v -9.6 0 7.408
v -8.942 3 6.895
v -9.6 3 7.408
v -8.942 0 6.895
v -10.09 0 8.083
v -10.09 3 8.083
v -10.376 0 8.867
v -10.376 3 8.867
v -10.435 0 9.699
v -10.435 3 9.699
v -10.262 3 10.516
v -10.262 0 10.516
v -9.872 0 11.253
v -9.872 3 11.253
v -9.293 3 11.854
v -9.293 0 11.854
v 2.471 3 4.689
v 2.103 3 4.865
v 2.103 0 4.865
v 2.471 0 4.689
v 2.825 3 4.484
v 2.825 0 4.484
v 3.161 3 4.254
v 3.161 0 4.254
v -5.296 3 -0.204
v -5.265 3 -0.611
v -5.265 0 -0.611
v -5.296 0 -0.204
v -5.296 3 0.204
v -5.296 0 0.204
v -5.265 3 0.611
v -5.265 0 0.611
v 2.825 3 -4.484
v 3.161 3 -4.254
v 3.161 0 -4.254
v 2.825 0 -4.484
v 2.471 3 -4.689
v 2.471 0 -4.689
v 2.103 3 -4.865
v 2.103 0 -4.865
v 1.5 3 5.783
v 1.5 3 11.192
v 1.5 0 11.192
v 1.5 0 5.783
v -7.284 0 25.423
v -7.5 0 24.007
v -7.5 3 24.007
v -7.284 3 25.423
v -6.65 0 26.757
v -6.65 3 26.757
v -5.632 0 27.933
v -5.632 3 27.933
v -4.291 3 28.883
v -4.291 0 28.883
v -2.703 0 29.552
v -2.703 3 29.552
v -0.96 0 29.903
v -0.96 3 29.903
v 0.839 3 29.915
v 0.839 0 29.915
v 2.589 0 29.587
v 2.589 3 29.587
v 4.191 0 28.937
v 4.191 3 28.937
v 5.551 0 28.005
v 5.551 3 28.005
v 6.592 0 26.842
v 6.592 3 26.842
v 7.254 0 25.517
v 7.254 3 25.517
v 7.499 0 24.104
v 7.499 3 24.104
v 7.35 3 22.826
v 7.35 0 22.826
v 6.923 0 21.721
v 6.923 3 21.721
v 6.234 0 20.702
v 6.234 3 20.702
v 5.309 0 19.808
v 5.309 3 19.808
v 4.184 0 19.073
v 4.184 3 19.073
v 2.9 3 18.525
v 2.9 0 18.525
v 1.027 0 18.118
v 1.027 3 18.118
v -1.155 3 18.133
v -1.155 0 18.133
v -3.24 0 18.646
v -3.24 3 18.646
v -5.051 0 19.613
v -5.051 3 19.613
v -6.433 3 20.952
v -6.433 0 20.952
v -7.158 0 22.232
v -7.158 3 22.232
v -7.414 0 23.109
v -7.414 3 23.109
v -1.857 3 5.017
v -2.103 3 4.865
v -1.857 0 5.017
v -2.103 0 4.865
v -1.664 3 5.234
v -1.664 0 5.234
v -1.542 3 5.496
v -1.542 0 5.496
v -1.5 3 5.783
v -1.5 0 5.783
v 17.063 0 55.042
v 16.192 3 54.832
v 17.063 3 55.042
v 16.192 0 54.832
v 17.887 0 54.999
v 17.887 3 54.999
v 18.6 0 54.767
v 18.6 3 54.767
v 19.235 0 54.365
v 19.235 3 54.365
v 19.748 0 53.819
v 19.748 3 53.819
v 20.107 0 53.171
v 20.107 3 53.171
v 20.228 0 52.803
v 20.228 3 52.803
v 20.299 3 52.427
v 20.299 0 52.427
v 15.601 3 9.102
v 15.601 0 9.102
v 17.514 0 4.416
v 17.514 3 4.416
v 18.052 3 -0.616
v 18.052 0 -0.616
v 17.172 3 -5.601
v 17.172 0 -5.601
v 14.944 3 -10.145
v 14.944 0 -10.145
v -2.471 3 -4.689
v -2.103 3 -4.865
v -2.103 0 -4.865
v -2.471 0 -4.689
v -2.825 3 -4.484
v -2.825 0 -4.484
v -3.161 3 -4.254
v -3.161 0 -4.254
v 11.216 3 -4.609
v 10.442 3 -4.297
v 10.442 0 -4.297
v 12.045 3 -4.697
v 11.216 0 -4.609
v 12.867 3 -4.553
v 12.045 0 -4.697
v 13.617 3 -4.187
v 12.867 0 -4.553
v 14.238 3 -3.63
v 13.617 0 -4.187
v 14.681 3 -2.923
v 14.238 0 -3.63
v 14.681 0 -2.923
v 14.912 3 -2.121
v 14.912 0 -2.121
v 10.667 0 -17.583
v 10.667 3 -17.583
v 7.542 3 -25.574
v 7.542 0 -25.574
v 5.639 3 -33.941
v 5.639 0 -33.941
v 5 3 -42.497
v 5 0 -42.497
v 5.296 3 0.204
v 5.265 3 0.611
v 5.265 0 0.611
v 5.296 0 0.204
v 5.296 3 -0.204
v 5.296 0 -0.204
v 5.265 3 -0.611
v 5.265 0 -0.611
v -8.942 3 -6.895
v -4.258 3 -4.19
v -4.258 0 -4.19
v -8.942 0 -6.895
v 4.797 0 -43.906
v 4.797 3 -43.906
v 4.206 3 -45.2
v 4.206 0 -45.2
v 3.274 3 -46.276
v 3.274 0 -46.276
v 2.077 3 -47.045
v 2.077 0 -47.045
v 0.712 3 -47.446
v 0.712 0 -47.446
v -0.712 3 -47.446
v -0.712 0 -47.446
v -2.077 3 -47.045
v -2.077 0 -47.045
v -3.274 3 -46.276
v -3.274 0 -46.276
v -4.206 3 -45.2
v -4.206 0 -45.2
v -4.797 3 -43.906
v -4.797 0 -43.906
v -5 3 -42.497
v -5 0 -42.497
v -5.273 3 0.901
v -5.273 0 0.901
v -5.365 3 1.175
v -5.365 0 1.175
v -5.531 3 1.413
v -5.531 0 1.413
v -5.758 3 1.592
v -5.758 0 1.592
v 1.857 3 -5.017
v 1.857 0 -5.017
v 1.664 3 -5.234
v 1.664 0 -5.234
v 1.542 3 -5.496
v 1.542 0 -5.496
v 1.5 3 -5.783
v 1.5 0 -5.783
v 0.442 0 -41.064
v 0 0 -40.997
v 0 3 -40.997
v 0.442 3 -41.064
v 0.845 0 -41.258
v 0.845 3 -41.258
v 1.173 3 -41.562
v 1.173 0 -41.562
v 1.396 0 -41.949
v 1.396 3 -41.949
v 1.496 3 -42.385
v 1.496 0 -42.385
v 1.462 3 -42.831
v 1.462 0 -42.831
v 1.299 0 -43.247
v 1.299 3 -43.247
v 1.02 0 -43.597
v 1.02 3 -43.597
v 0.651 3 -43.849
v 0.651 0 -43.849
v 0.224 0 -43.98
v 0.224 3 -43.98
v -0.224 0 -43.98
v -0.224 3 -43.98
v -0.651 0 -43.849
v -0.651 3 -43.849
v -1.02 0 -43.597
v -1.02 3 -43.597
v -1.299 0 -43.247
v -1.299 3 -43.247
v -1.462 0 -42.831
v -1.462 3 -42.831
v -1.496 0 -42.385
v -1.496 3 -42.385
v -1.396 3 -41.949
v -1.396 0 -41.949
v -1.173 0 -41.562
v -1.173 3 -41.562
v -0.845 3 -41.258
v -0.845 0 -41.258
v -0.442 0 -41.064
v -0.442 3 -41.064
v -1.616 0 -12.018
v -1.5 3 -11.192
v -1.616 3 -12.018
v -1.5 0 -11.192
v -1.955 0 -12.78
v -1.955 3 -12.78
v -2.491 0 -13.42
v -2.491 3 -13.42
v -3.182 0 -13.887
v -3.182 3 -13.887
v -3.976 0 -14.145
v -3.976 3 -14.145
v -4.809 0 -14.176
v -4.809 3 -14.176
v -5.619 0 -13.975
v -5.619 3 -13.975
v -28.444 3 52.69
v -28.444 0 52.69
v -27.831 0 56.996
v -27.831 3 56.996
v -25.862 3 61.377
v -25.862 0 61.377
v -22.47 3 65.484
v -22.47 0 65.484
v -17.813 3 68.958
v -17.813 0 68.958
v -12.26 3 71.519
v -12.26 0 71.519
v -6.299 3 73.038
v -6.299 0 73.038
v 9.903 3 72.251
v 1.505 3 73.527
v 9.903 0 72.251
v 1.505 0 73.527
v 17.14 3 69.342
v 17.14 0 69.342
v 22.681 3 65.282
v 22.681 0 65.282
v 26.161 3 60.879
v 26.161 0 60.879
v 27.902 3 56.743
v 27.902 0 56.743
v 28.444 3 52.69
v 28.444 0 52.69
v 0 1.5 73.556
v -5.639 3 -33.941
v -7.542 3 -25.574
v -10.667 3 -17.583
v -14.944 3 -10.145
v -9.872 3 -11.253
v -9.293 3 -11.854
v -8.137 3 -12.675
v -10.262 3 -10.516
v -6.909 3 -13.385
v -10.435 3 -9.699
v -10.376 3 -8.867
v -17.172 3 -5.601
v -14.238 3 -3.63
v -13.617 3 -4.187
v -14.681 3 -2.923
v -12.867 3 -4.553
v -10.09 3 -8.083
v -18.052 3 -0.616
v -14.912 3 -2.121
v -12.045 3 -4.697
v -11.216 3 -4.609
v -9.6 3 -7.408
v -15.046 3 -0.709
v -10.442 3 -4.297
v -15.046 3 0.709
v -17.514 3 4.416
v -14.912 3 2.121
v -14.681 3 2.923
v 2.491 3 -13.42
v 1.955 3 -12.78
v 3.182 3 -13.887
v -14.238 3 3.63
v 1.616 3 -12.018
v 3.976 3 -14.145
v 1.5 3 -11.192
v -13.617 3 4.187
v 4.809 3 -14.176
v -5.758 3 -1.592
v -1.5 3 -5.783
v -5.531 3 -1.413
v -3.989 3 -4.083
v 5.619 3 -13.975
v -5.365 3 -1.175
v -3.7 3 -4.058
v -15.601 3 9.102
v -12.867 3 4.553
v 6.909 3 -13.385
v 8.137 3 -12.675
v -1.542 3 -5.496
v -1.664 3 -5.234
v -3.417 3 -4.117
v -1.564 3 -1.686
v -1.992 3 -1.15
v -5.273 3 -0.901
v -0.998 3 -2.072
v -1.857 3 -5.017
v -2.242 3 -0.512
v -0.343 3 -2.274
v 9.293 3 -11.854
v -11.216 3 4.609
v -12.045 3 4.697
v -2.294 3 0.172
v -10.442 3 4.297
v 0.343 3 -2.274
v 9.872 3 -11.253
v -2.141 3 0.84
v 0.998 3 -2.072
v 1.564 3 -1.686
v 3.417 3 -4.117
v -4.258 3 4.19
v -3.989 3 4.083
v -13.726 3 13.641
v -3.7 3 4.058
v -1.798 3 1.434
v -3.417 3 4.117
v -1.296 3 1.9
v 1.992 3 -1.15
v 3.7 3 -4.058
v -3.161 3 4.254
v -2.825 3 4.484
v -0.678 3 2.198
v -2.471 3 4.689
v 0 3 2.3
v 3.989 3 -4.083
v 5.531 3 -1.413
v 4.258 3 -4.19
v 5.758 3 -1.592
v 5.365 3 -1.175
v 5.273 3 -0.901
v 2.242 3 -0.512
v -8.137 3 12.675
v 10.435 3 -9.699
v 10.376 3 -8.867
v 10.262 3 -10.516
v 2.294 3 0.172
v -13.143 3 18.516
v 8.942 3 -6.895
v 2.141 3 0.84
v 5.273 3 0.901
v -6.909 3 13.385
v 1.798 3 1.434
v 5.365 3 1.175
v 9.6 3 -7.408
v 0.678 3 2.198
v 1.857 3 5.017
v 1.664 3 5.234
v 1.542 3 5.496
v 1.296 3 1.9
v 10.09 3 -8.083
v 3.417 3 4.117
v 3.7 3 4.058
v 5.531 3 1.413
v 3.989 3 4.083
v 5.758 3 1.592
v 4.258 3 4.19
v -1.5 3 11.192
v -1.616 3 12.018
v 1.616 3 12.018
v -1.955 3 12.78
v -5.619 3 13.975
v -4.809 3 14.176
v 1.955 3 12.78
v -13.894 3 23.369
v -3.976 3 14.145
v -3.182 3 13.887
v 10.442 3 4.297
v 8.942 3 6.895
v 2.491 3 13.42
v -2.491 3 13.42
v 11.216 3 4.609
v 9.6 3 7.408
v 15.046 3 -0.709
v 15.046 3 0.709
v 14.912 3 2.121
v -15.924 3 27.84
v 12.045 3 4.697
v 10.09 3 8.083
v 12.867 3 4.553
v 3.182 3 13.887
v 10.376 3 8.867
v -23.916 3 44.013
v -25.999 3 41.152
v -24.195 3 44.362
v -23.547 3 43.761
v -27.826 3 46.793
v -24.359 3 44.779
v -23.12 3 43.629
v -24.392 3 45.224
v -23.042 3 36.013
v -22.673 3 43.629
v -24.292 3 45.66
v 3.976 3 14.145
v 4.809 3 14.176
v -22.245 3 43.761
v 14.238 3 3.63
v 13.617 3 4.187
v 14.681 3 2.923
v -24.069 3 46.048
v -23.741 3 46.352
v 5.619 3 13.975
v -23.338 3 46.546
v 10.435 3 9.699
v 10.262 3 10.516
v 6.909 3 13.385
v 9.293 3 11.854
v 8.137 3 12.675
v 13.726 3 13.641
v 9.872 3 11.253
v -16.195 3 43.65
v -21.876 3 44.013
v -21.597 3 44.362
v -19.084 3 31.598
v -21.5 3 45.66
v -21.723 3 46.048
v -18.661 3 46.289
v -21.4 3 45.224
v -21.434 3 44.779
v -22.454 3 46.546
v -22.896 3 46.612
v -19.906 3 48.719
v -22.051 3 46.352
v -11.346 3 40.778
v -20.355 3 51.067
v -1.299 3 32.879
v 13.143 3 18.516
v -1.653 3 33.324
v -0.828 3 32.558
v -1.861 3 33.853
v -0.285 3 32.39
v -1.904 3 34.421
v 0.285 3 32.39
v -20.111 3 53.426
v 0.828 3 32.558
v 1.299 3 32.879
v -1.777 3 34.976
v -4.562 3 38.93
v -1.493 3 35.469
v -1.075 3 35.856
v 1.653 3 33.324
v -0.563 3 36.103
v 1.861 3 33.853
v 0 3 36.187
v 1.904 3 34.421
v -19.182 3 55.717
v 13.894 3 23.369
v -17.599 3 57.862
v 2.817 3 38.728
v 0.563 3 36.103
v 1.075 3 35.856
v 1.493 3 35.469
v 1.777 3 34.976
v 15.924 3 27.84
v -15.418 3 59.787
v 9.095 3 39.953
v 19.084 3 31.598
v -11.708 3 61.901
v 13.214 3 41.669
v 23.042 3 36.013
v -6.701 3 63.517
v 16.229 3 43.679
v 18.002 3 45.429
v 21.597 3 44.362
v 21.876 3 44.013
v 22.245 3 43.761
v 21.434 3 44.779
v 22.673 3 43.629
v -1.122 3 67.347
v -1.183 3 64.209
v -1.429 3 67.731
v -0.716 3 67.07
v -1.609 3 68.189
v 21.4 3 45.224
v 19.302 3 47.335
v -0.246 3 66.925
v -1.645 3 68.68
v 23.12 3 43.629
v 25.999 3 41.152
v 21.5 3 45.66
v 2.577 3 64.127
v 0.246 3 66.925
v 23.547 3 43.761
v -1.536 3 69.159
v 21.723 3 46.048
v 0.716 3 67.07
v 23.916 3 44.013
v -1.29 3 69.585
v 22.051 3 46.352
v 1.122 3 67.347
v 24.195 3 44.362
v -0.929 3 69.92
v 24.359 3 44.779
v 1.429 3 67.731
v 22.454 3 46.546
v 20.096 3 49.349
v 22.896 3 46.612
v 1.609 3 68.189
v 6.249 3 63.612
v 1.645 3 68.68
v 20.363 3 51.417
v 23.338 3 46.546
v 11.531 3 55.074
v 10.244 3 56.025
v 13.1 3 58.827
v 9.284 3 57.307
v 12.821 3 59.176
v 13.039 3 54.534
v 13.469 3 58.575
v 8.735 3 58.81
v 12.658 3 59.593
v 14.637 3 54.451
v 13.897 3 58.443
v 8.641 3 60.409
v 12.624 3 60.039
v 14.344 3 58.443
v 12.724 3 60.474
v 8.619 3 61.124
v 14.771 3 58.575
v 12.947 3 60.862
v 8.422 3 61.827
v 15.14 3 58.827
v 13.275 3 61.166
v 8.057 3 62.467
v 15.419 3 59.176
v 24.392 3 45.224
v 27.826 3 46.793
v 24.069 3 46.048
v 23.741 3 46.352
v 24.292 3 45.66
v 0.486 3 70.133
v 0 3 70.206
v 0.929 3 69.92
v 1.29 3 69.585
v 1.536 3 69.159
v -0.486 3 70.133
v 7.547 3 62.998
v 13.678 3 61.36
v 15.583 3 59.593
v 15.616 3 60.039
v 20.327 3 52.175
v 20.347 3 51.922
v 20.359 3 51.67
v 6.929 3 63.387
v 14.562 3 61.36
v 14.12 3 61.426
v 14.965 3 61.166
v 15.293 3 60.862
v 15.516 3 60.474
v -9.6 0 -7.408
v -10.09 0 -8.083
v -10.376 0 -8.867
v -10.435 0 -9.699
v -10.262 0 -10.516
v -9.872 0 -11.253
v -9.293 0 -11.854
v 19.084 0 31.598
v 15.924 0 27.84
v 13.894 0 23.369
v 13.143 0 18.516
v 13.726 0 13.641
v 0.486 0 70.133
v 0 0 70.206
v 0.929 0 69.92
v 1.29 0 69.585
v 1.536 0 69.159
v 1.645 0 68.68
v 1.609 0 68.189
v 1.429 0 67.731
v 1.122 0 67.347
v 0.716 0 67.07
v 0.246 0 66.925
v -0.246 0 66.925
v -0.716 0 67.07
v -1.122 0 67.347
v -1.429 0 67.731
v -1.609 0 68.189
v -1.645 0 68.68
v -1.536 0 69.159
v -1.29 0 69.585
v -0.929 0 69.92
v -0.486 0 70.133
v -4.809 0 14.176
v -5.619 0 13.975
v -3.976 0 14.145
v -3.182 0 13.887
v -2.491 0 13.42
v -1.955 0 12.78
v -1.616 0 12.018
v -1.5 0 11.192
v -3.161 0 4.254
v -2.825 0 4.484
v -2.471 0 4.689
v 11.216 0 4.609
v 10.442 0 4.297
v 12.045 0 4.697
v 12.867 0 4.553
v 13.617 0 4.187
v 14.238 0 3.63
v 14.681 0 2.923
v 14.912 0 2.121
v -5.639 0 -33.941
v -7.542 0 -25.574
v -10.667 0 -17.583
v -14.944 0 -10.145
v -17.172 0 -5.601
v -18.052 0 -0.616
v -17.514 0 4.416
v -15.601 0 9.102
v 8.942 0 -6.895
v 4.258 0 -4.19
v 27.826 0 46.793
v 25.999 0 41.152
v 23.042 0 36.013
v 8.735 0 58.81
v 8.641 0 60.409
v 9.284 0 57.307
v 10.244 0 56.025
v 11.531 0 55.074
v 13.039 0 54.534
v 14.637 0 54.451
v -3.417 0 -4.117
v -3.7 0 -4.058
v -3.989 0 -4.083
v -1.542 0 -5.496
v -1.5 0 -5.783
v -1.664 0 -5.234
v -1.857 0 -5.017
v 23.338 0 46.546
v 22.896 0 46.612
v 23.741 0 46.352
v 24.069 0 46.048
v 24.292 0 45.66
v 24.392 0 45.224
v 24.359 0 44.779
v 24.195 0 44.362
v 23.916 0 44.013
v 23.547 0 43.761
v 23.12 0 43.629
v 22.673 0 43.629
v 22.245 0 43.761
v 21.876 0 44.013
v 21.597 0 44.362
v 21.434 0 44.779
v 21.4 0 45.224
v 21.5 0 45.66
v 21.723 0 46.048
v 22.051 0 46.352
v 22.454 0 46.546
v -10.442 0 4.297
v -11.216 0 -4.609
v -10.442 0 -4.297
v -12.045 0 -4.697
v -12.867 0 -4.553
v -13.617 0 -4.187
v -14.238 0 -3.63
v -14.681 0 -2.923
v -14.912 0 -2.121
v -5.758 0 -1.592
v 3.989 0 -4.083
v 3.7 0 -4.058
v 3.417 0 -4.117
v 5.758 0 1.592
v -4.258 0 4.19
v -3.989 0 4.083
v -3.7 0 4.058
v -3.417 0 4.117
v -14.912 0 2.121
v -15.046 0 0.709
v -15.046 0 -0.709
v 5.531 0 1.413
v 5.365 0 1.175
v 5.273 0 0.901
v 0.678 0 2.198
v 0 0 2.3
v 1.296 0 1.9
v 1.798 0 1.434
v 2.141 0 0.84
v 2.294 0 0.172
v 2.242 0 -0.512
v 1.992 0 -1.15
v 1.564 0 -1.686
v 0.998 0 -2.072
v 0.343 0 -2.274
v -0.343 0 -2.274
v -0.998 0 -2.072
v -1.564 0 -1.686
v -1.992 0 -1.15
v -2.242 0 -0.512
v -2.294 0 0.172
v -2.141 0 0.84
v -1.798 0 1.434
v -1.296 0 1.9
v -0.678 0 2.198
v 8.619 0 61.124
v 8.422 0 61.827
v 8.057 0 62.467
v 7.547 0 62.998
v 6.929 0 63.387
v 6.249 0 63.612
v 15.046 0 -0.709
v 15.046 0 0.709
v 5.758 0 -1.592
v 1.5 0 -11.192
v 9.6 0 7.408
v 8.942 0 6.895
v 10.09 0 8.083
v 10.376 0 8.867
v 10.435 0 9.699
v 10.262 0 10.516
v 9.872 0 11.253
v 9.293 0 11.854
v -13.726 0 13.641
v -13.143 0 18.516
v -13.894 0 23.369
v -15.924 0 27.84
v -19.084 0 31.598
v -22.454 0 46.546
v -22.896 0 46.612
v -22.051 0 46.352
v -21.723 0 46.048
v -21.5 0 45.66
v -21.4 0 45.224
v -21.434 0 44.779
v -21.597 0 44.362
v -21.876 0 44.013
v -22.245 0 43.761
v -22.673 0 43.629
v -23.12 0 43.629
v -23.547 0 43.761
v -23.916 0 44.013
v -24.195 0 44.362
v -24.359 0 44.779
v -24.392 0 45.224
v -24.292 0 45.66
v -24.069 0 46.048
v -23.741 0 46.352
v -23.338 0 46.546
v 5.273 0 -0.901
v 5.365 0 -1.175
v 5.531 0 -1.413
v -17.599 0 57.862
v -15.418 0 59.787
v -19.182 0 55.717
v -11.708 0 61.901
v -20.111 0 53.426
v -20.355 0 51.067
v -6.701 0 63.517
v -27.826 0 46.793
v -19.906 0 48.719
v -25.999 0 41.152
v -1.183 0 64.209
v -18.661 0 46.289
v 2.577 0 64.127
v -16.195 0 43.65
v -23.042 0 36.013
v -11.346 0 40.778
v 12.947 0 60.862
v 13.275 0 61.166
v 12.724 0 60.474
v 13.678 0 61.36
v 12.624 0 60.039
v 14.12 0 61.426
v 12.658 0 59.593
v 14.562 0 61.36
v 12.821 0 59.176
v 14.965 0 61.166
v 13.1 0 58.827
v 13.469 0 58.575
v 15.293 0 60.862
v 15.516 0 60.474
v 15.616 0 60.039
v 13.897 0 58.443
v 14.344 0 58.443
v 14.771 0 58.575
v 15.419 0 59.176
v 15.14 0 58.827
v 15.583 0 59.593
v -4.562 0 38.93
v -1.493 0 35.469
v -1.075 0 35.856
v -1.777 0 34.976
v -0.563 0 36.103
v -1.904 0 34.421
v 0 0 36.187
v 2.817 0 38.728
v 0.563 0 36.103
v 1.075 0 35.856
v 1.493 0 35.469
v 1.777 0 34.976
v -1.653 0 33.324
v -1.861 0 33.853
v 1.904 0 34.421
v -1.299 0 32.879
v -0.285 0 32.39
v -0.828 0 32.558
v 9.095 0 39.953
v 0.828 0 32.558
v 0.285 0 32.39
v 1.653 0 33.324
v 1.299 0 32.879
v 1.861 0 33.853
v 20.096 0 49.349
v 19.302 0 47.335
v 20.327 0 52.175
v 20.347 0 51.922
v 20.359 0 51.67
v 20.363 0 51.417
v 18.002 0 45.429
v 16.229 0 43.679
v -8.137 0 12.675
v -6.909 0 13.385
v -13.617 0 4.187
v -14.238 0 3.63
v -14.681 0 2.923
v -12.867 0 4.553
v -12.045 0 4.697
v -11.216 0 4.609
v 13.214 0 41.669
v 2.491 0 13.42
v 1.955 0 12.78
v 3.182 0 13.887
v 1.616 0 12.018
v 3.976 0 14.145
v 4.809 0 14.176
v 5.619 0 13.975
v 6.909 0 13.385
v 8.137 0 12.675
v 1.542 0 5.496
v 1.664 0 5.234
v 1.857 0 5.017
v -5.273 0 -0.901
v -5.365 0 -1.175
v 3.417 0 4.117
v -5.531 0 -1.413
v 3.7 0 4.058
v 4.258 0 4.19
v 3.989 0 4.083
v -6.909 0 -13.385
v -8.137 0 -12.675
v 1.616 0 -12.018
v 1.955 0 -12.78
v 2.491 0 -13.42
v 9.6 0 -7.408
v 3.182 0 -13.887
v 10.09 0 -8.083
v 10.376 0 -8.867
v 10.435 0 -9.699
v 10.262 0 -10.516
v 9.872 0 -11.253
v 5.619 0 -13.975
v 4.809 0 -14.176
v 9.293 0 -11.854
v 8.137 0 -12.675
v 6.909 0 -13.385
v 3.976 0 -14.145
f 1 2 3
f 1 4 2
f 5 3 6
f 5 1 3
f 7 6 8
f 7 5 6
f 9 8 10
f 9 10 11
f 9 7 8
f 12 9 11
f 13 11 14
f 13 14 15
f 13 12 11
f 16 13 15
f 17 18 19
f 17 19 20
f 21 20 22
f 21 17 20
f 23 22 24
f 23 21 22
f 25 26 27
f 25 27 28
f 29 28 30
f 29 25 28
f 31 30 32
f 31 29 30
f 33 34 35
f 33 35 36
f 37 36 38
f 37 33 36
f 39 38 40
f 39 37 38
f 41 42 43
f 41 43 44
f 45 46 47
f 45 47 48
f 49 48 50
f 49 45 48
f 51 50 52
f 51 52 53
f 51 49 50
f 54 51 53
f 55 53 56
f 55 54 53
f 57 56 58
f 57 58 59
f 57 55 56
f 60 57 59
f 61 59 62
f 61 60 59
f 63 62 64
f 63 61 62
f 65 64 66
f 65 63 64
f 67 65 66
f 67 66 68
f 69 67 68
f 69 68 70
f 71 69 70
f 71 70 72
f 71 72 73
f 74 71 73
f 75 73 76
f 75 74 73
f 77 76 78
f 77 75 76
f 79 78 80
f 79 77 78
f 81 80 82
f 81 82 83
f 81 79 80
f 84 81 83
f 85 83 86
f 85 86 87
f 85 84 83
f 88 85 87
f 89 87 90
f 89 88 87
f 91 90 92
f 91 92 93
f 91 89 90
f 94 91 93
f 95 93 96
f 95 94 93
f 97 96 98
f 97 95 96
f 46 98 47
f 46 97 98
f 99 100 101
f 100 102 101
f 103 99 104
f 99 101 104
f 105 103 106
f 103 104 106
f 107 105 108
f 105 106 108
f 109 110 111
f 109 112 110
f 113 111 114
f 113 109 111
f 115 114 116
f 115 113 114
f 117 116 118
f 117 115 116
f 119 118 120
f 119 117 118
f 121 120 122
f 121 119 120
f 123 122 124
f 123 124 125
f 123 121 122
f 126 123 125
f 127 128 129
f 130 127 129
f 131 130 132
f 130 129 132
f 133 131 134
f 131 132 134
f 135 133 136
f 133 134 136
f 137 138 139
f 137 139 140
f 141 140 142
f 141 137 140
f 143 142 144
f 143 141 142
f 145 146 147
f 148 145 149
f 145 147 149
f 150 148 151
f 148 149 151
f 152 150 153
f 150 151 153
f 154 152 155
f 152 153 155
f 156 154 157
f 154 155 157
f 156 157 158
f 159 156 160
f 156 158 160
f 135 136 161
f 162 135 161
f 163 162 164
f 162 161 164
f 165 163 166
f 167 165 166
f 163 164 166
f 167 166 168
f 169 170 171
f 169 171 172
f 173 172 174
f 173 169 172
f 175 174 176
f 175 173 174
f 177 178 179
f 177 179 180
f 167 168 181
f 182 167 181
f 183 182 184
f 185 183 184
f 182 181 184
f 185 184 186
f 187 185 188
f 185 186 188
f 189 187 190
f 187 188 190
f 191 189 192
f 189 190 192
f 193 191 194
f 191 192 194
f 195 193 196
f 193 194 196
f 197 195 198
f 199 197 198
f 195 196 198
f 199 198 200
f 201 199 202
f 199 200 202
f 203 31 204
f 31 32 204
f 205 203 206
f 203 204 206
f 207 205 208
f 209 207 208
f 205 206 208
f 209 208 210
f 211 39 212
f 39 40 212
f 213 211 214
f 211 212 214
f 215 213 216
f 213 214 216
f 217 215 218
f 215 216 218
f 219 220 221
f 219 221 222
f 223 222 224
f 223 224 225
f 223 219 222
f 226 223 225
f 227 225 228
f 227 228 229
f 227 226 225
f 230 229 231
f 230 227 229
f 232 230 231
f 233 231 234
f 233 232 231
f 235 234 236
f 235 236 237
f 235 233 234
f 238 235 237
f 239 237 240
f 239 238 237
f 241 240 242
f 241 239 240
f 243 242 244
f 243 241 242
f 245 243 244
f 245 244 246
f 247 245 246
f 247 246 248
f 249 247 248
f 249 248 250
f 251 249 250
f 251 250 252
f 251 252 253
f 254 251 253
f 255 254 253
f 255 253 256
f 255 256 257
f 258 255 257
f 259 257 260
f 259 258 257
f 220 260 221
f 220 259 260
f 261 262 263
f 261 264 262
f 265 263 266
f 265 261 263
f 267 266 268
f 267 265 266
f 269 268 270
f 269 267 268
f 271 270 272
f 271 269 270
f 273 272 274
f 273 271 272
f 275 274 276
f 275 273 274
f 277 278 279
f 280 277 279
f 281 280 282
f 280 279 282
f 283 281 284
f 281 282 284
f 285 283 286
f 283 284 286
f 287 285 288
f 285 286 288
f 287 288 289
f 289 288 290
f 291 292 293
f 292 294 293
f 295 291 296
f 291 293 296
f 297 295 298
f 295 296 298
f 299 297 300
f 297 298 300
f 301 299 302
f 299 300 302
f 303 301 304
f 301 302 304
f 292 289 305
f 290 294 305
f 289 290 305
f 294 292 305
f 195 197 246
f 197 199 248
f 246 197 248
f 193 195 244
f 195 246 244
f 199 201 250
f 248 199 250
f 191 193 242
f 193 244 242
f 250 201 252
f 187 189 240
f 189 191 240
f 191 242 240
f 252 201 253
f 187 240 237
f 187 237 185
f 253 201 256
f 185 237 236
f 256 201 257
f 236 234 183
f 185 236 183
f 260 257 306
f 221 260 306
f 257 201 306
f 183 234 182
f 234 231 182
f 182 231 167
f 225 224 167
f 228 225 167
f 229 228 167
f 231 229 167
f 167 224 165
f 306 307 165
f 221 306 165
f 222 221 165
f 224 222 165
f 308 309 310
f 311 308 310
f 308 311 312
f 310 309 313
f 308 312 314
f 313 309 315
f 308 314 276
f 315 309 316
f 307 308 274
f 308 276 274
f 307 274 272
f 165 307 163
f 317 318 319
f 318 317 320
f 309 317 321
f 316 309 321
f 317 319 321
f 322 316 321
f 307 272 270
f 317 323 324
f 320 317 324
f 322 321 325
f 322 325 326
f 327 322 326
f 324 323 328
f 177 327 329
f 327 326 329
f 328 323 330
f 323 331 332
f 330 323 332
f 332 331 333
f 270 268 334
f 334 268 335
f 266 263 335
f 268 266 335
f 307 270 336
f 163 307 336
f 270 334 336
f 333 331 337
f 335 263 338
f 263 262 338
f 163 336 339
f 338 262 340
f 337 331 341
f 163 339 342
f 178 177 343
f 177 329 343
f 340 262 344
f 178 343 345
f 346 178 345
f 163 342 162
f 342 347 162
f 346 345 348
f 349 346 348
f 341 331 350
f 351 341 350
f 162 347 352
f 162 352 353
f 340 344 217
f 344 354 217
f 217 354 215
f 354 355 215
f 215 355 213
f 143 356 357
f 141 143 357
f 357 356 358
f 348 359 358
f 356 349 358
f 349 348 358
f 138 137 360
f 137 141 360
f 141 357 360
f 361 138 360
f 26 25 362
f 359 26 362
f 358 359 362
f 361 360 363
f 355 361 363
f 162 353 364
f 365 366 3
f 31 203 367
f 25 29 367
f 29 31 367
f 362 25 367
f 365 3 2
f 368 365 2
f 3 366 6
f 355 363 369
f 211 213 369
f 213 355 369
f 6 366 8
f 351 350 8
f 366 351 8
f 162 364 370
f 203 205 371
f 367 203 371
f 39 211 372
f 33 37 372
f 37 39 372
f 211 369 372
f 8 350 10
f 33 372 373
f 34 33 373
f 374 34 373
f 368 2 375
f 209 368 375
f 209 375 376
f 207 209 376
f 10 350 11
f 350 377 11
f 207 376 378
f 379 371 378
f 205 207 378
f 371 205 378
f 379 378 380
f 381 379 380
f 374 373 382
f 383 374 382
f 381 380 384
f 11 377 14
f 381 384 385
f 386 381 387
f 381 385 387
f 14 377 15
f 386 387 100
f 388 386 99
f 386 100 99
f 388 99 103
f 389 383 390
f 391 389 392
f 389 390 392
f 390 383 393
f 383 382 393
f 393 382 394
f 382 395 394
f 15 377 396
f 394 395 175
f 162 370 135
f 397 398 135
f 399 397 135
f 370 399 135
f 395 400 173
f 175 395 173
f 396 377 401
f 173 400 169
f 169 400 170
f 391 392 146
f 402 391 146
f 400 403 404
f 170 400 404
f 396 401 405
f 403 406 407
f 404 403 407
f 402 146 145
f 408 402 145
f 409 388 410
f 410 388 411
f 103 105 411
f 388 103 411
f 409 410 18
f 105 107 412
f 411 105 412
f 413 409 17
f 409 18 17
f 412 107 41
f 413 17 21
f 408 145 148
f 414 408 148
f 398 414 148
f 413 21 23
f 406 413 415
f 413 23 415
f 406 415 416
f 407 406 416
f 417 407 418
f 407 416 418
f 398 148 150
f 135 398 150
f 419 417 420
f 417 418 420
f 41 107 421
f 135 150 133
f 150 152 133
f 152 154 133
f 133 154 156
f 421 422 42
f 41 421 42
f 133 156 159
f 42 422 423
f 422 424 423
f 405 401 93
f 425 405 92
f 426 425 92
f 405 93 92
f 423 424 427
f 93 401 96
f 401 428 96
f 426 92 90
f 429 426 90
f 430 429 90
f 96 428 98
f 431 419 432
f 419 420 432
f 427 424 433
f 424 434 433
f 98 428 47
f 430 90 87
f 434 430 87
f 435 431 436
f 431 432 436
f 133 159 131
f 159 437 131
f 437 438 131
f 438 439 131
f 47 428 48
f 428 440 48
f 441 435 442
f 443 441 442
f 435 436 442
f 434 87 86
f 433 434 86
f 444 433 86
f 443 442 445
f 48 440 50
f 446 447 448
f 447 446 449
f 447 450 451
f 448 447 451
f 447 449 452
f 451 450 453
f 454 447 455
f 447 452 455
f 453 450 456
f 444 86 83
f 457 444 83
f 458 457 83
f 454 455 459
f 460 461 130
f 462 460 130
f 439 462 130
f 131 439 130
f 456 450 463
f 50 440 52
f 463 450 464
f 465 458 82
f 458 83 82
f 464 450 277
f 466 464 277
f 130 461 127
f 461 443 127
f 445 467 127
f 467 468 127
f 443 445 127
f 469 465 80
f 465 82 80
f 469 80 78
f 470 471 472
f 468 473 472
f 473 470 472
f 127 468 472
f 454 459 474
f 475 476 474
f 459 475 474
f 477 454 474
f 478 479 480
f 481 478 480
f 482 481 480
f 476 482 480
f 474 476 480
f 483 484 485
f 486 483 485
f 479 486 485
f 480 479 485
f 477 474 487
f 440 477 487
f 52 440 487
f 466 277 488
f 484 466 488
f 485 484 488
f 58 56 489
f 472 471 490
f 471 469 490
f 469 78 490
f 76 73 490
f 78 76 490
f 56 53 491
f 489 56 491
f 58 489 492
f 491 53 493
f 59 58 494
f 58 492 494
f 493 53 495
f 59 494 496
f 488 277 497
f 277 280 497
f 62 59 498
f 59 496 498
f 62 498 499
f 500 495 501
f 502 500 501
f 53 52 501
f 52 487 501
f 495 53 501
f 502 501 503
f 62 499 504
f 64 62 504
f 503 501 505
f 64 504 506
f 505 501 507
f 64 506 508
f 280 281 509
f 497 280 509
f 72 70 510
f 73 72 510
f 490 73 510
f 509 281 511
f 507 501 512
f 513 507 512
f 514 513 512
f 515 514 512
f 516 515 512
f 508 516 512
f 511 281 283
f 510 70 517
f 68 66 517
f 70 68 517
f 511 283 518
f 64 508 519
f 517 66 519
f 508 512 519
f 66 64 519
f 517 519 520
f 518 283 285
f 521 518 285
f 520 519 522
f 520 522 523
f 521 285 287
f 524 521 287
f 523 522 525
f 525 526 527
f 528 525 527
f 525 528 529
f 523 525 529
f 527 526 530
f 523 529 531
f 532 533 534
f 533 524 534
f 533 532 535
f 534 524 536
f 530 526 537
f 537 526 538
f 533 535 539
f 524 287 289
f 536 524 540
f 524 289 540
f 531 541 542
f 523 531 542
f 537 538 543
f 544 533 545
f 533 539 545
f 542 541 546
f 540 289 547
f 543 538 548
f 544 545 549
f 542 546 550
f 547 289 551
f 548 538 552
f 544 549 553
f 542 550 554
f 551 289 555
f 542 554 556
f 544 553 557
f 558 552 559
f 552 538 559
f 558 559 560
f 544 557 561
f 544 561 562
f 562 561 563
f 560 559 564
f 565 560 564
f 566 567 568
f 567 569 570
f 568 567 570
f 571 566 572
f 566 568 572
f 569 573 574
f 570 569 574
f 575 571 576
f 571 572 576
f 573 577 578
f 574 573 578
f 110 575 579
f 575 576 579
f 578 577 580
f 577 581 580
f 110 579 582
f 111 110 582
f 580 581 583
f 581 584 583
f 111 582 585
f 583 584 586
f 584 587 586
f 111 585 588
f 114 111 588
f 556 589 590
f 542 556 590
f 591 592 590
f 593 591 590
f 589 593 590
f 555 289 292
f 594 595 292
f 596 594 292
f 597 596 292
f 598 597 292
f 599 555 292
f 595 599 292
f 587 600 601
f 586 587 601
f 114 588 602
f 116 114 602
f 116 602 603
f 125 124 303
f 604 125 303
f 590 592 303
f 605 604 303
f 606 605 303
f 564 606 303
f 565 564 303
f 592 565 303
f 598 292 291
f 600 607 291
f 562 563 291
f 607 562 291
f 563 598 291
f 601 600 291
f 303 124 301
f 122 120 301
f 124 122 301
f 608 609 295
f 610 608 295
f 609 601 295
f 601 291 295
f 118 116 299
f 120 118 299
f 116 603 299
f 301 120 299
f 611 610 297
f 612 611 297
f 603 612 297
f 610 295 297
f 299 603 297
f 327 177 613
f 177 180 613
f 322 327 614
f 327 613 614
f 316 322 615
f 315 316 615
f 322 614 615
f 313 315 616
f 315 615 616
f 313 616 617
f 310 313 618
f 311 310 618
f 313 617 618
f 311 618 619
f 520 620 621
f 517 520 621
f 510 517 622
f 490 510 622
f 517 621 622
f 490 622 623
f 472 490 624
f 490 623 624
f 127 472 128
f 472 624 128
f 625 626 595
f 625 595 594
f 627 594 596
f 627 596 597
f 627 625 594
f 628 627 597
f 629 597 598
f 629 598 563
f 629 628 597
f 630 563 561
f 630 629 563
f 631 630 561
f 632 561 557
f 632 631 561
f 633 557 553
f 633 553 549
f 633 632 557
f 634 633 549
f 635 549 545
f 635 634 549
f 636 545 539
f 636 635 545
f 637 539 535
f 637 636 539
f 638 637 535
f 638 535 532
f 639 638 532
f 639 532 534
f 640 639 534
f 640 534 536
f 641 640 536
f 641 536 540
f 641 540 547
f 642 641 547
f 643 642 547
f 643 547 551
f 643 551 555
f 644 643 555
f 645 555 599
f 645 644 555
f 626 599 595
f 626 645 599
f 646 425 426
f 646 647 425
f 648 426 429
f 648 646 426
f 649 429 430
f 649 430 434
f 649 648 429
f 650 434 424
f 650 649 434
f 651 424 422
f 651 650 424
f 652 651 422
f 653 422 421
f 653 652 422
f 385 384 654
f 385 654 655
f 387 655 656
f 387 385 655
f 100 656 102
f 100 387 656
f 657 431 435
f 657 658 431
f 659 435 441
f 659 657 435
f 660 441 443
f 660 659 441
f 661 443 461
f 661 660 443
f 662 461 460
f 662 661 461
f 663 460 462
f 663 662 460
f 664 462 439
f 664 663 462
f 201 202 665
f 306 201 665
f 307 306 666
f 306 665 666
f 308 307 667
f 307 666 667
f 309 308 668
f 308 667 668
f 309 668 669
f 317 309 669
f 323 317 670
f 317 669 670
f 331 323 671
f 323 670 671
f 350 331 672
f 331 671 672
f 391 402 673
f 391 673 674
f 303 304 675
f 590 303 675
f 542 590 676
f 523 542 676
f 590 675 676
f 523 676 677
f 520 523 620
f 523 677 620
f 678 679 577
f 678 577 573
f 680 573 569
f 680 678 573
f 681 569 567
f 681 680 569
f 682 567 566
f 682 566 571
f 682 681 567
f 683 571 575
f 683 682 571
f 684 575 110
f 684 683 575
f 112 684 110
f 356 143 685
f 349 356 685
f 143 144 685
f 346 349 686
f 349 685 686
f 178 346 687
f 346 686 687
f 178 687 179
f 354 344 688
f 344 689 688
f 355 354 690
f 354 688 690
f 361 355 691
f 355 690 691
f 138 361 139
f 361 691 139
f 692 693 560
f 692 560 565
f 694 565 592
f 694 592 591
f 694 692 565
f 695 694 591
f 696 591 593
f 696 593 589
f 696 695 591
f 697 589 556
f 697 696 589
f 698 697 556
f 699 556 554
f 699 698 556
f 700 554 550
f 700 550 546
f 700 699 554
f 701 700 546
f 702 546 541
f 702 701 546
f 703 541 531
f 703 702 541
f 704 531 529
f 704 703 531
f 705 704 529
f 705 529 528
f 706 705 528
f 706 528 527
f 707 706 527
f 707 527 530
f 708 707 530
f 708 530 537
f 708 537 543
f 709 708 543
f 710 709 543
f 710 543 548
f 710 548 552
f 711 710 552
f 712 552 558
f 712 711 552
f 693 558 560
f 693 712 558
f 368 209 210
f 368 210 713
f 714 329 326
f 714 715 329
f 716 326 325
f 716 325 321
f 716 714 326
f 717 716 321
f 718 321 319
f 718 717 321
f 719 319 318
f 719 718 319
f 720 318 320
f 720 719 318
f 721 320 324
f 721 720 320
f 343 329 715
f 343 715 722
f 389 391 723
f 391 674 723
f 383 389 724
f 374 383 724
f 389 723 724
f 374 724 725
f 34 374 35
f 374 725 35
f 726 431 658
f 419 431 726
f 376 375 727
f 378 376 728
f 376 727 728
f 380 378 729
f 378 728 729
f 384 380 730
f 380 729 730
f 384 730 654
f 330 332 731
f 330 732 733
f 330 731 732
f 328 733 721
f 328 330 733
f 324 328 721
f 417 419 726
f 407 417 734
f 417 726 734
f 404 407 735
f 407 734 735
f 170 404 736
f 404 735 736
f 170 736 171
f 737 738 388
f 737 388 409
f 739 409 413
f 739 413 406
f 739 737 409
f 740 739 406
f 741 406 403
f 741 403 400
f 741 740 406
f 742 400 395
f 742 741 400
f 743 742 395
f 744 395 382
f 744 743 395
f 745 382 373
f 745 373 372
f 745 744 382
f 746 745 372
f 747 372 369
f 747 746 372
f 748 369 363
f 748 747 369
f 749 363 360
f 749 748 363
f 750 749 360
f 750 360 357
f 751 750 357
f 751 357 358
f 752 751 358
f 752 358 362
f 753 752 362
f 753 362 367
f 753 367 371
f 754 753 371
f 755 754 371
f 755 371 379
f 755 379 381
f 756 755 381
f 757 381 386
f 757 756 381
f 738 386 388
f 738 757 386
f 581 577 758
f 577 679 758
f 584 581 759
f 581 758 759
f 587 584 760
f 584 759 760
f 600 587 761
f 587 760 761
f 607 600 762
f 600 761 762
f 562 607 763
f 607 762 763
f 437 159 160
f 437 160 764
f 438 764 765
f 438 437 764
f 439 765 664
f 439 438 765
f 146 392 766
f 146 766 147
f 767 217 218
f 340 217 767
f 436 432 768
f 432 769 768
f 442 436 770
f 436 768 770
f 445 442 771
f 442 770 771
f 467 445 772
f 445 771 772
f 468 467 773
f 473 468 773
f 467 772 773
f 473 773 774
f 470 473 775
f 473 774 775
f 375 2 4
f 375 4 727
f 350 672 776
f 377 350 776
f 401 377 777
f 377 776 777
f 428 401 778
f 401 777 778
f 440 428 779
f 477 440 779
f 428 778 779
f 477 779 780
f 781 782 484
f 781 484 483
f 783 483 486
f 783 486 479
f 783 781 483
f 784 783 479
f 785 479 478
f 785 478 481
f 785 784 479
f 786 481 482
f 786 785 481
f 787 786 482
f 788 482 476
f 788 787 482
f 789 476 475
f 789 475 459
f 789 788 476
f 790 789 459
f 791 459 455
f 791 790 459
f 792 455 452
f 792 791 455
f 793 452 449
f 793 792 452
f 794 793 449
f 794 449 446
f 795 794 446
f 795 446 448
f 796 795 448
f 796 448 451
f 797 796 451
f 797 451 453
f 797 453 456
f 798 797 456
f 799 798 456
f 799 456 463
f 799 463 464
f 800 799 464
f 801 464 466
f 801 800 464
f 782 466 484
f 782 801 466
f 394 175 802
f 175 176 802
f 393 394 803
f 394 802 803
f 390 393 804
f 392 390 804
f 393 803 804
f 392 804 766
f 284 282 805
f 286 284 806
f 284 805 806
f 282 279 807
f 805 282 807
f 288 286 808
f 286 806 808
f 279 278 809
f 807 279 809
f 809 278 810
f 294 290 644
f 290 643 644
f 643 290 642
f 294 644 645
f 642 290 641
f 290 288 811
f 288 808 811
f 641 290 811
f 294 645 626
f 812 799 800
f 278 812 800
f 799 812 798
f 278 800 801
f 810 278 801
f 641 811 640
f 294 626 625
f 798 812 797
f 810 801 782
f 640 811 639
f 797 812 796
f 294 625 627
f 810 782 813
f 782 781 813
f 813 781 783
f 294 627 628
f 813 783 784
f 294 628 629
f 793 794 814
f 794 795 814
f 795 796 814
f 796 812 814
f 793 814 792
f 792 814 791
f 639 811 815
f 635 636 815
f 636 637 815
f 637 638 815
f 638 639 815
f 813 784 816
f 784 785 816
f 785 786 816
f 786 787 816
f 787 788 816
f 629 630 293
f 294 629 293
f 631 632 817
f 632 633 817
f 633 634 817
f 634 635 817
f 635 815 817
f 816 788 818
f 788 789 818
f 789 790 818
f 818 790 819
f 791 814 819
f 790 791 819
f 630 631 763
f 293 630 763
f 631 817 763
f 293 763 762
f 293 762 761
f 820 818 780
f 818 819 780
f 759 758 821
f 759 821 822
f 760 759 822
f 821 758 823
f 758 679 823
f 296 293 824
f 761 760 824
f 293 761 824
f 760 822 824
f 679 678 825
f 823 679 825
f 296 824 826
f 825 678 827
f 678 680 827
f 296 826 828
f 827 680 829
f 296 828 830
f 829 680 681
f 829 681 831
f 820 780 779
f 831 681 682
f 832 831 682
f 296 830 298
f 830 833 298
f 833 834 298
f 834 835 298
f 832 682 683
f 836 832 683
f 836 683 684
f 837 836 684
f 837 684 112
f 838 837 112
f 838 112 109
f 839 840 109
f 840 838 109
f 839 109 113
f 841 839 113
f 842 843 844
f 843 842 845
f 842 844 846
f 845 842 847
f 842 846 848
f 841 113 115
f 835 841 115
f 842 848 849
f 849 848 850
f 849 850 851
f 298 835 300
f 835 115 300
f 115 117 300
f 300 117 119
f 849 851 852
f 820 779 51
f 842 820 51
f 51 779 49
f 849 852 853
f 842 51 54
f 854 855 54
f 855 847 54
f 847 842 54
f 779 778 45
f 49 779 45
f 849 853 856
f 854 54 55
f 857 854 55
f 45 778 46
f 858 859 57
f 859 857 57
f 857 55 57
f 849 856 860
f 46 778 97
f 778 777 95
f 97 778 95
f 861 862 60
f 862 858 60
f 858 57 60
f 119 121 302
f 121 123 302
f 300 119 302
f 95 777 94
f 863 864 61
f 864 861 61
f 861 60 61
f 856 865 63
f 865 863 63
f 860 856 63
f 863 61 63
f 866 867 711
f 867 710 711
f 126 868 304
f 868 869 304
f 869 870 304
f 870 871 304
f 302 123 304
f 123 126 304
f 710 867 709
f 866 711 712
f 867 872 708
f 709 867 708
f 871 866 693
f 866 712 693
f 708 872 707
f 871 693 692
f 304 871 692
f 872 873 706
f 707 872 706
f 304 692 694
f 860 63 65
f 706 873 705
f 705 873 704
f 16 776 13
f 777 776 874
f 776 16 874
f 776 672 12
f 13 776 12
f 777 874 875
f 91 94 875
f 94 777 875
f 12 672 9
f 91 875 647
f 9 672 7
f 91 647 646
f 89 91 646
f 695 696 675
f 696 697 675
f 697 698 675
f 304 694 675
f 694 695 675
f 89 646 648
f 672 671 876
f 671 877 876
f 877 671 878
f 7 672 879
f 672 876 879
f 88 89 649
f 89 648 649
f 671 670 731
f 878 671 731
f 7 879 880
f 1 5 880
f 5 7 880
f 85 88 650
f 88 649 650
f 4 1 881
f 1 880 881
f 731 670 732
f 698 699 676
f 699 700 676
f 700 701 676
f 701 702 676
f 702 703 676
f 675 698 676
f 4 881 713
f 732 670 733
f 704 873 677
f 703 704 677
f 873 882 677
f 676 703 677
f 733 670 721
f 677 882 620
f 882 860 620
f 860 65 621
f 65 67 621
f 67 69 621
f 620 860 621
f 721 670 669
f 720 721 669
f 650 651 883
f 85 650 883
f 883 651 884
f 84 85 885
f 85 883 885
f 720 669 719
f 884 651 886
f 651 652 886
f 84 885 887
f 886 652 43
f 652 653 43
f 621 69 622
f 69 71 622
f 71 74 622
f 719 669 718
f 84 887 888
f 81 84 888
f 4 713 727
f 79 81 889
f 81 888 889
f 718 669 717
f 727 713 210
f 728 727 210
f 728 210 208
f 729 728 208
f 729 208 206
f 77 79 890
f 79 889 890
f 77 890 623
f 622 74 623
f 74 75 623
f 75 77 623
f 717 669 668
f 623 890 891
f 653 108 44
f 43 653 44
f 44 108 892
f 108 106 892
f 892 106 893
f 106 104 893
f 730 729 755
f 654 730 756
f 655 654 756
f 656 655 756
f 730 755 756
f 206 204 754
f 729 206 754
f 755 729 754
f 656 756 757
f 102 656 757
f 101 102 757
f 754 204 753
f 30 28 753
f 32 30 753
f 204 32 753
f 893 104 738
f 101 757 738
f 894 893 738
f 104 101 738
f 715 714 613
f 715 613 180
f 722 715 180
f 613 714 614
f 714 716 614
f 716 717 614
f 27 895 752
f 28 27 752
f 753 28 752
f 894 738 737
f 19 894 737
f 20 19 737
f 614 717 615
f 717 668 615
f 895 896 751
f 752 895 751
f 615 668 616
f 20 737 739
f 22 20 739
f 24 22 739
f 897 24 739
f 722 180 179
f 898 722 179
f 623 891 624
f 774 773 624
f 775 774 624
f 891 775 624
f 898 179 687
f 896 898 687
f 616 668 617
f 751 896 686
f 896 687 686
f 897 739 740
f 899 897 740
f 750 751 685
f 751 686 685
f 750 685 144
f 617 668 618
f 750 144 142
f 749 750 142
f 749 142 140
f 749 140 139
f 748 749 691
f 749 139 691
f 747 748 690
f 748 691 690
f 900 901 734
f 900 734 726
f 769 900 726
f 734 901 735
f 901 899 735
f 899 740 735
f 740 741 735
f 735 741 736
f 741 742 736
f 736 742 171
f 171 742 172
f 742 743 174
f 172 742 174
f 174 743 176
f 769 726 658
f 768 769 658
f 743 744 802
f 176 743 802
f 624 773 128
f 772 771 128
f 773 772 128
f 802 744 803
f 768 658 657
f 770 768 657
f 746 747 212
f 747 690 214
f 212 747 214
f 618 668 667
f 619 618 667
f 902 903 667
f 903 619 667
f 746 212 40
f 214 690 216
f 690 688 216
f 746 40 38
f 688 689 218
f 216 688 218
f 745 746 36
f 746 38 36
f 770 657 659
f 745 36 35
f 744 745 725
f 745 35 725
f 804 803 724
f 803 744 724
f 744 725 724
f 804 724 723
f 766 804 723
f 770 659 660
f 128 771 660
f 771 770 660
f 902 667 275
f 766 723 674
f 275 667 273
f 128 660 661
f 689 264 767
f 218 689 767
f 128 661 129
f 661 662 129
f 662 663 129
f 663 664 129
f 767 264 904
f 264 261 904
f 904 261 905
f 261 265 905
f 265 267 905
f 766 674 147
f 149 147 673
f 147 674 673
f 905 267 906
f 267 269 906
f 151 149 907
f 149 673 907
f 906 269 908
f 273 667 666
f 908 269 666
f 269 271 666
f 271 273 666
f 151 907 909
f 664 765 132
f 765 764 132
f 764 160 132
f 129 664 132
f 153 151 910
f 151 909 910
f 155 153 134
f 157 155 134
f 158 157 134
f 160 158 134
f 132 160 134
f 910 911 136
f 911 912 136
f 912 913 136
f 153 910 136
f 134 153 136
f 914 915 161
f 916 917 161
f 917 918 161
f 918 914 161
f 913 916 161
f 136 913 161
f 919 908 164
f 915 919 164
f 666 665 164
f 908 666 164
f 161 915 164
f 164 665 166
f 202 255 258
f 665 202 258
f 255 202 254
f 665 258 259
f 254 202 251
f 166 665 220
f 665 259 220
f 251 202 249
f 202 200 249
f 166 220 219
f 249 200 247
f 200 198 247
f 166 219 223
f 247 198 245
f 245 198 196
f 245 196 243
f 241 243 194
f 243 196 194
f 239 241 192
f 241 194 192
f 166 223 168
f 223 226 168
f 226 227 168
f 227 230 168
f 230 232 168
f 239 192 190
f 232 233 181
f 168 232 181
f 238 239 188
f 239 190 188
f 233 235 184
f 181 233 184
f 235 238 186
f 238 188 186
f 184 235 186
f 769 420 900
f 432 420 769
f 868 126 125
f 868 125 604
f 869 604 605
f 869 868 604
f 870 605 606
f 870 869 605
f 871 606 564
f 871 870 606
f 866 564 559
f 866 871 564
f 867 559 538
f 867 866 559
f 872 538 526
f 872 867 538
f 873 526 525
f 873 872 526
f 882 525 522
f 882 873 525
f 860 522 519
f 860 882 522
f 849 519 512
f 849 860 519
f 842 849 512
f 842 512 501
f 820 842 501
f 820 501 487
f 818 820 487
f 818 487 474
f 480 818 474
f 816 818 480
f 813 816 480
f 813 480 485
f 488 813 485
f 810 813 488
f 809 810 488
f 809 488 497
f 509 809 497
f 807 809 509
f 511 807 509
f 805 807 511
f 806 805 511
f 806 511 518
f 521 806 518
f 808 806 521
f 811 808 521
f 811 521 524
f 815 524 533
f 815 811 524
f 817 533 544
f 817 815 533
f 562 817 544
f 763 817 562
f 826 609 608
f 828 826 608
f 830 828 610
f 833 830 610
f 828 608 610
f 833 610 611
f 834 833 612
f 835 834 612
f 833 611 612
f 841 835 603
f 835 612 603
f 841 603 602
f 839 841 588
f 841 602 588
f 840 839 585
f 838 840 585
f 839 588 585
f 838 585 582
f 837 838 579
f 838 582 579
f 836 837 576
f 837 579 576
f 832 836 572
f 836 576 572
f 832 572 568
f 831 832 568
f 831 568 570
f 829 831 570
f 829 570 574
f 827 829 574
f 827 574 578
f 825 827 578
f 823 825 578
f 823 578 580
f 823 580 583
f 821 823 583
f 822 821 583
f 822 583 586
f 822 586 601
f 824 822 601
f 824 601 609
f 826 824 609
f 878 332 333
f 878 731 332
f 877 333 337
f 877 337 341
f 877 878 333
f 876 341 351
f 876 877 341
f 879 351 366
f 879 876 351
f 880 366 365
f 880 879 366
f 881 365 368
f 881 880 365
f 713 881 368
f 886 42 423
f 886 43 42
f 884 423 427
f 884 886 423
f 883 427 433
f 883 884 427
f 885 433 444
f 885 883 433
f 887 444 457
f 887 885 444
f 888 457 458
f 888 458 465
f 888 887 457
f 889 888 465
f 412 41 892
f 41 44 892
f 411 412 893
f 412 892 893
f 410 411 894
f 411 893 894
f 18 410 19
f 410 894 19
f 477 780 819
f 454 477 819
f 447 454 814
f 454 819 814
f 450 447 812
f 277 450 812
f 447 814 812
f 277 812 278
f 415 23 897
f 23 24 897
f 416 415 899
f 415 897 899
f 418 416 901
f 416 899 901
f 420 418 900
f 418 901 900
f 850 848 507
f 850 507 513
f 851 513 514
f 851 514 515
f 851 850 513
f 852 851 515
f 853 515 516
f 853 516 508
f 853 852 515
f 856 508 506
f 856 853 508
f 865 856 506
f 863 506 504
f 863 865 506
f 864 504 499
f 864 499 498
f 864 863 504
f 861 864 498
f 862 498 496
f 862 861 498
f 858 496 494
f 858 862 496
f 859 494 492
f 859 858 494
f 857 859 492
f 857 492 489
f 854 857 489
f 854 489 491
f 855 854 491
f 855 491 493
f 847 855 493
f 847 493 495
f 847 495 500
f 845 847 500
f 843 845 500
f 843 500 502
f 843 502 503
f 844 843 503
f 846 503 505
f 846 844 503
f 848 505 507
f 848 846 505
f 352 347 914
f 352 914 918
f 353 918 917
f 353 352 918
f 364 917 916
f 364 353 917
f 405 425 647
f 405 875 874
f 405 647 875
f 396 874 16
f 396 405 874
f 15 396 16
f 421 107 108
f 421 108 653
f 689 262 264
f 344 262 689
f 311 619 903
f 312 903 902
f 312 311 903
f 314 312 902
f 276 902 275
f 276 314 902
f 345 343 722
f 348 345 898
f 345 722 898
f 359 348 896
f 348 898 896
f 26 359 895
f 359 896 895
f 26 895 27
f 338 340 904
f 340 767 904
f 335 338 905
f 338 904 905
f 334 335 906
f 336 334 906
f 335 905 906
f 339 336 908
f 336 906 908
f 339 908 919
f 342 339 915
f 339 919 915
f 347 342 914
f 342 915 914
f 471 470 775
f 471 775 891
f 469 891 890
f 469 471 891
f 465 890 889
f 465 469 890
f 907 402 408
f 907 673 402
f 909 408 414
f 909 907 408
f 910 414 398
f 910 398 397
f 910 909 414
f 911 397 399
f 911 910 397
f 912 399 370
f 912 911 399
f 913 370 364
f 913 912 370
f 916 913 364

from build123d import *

# Parameters (mm, degrees)
SKETCH1_R                = 1.5
SKETCH1_R_2              = 2.3
SKETCH1_R_3              = 1.65
SKETCH1_R_4              = 1.909188309
SKETCH1_RX               = 20.362751378
SKETCH1_RY               = 12.812950259
SKETCH1_RX_2             = 7.5
SKETCH1_RY_2             = 5.944828068
BOSS_EXTRUDE1_DEPTH      = 3
SKETCH2_R                = 5.5
BOSS_EXTRUDE2_DEPTH      = 3
FILLET1_R                = 3
SKETCH3_R                = 1.5
CUT_EXTRUDE1_DEPTH       = 79.921363197
CUT_EXTRUDE2_DEPTH       = 79.921363197
FILLET2_R                = 3
FILLET3_R                = 1
CIRPATTERN1_COUNT        = 6
FILLET2_OF_CIRPATTERN1_R = 3
FILLET3_OF_CIRPATTERN1_R = 1


with BuildPart() as part:
    # Sketch1 → Boss-Extrude1 (new body)
    with BuildSketch(Plane(origin=(0, 0, 0), x_dir=(1, 0, 0), z_dir=(0, 1, 0))):
        with BuildLine():
            ThreePointArc((-14.944034973, 10.145236258), (-18.051873862, 0.616319792), (-15.601179111, -9.102373886))
            ThreePointArc((-15.601179111, -9.102373886), (-13.352587893, -20.968024673), (-19.083723838, -31.598354482))
            ThreePointArc((-19.083723838, -31.598354482), (-25.998546823, -41.152307046), (-28.443609023, -52.689830928))
            add(Edge.make_bspline(
                [(-28.443609023, -52.689830928), (-28.443609023, -73.556390977), (0, -73.556390977), (28.443609023, -73.556390977), (28.443609023, -52.689830928)],
                knots=[0, 0, 0, 1.570796327, 1.570796327, 3.141592654, 3.141592654, 3.141592654], degree=2, weights=[1, 0.707106781, 1, 0.707106781, 1]))
            ThreePointArc((28.443609023, -52.689830928), (25.998546823, -41.152307046), (19.083723838, -31.598354482))
            ThreePointArc((19.083723838, -31.598354482), (13.352587893, -20.968024673), (15.601179111, -9.102373886))
            ThreePointArc((15.601179111, -9.102373886), (18.051873862, 0.616319792), (14.944034973, 10.145236258))
            ThreePointArc((14.944034973, 10.145236258), (7.542106487, 25.574270902), (5, 42.497076519))
            ThreePointArc((5, 42.497076519), (0, 47.497076519), (-5, 42.497076519))
            ThreePointArc((-5, 42.497076519), (-7.542106487, 25.574270902), (-14.944034973, 10.145236258))
        make_face()
        with Locations(Location((22.896149501, -45.11234526, 0), (0, 0, 270))):
            Circle(SKETCH1_R, mode=Mode.SUBTRACT)
        with Locations(Location((-22.896149501, -45.11234526, 0), (0, 0, 270))):
            Circle(SKETCH1_R, mode=Mode.SUBTRACT)
        with Locations(Location((0, 0, 0), (0, 0, 270))):
            Circle(SKETCH1_R_2, mode=Mode.SUBTRACT)
        with Locations(Location((0, 42.497076519, 0), (0, 0, 270))):
            Circle(SKETCH1_R, mode=Mode.SUBTRACT)
        with Locations(Location((0, -68.556390977, 0), (0, 0, 270))):
            Circle(SKETCH1_R_3, mode=Mode.SUBTRACT)
        with Locations(Location((0, -34.278195489, 0), (0, 0, 270))):
            Circle(SKETCH1_R_4, mode=Mode.SUBTRACT)
        with Locations((0, -51.417293233)):
            Ellipse(SKETCH1_RX, SKETCH1_RY, mode=Mode.SUBTRACT)
        with Locations(Location((0, -24.007219936), (0, 0, -180))):
            Ellipse(SKETCH1_RX_2, SKETCH1_RY_2, mode=Mode.SUBTRACT)
    extrude(amount=BOSS_EXTRUDE1_DEPTH)

    # Sketch2 → Boss-Extrude2 (add)
    with BuildSketch(Plane.XZ):
        with Locations((14.120155711, 59.926468993)):
            Circle(SKETCH2_R)
    extrude(amount=-BOSS_EXTRUDE2_DEPTH)

    # Fillet1
    fillet1_edges = [part.edges().sort_by_distance(p)[0] for p in [
        (9.416956428, 1.5, 62.777769838),
        (18.562854805, 1.5, 56.684182029),
    ]]
    fillet(fillet1_edges, radius=FILLET1_R)

    # Sketch3 → Cut-Extrude1 (cut, through all)
    with BuildSketch(Plane(origin=(0, 3, 0), x_dir=(1, 0, 0), z_dir=(0, 1, 0))):
        with Locations(Location((14.120155711, -59.926468993, 0), (0, 0, 270))):
            Circle(SKETCH3_R)
    extrude(amount=-CUT_EXTRUDE1_DEPTH, mode=Mode.SUBTRACT)

    # Sketch4 → Cut-Extrude2 (cut, through all)
    with BuildSketch(Plane(origin=(0, 3, 0), x_dir=(1, 0, 0), z_dir=(0, 1, 0))):
        with BuildLine():
            Line((-1.5, -5.083306011), (-1.5, -14.987516432))
            ThreePointArc((-1.5, -14.987516432), (-7.531195934, -13.044414), (-12.229569969, -8.792796322))
            Line((-12.229569969, -8.792796322), (-3.652272141, -3.840691111))
            ThreePointArc((-3.652272141, -3.840691111), (-2.65, -4.58993464), (-1.5, -5.083306011))
        make_face()
    cut_extrude2 = extrude(amount=-CUT_EXTRUDE2_DEPTH, mode=Mode.SUBTRACT)

    # Fillet2
    fillet2_edges = [part.edges().sort_by_distance(p)[0] for p in [
        (-1.5, 1.5, 14.987516432),
        (-12.229569969, 1.5, 8.792796322),
    ]]
    fillet(fillet2_edges, radius=FILLET2_R)

    # Fillet3
    fillet3_edges = [part.edges().sort_by_distance(p)[0] for p in [
        (-3.652272141, 1.5, 3.840691111),
        (-1.5, 1.5, 5.083306011),
    ]]
    fillet(fillet3_edges, radius=FILLET3_R)

    # CirPattern1: Cut-Extrude2 ×6 about axis
    cirpattern1_axis = Axis((0, 0, 0), (0, 1, 0))
    for i in range(1, CIRPATTERN1_COUNT):
        add(cut_extrude2.rotate(cirpattern1_axis, i * 360 / CIRPATTERN1_COUNT), mode=Mode.SUBTRACT)

    # Fillet2 of CirPattern1
    fillet2_of_cirpattern1_edges = [part.edges().sort_by_distance(p)[0] for p in [
        (12.229569969, 1.5, 8.792796322),
        (1.5, 1.5, 14.987516432),
        (13.72956997, 1.5, -6.19472011),
        (13.72956997, 1.5, 6.19472011),
        (1.5, 1.5, -14.987516432),
        (12.229569969, 1.5, -8.792796322),
        (-12.229569969, 1.5, -8.792796322),
        (-1.5, 1.5, -14.987516432),
        (-13.72956997, 1.5, 6.19472011),
        (-13.72956997, 1.5, -6.19472011),
    ]]
    fillet(fillet2_of_cirpattern1_edges, radius=FILLET2_OF_CIRPATTERN1_R)

    # Fillet3 of CirPattern1
    fillet3_of_cirpattern1_edges = [part.edges().sort_by_distance(p)[0] for p in [
        (1.5, 1.5, 5.083306011),
        (3.652272141, 1.5, 3.840691111),
        (5.152272141, 1.5, 1.2426149),
        (5.152272141, 1.5, -1.2426149),
        (3.652272141, 1.5, -3.840691111),
        (1.5, 1.5, -5.083306011),
        (-1.5, 1.5, -5.083306011),
        (-3.652272141, 1.5, -3.840691111),
        (-5.152272141, 1.5, -1.2426149),
        (-5.152272141, 1.5, 1.2426149),
    ]]
    fillet(fillet3_of_cirpattern1_edges, radius=FILLET3_OF_CIRPATTERN1_R)


solid = part.part
